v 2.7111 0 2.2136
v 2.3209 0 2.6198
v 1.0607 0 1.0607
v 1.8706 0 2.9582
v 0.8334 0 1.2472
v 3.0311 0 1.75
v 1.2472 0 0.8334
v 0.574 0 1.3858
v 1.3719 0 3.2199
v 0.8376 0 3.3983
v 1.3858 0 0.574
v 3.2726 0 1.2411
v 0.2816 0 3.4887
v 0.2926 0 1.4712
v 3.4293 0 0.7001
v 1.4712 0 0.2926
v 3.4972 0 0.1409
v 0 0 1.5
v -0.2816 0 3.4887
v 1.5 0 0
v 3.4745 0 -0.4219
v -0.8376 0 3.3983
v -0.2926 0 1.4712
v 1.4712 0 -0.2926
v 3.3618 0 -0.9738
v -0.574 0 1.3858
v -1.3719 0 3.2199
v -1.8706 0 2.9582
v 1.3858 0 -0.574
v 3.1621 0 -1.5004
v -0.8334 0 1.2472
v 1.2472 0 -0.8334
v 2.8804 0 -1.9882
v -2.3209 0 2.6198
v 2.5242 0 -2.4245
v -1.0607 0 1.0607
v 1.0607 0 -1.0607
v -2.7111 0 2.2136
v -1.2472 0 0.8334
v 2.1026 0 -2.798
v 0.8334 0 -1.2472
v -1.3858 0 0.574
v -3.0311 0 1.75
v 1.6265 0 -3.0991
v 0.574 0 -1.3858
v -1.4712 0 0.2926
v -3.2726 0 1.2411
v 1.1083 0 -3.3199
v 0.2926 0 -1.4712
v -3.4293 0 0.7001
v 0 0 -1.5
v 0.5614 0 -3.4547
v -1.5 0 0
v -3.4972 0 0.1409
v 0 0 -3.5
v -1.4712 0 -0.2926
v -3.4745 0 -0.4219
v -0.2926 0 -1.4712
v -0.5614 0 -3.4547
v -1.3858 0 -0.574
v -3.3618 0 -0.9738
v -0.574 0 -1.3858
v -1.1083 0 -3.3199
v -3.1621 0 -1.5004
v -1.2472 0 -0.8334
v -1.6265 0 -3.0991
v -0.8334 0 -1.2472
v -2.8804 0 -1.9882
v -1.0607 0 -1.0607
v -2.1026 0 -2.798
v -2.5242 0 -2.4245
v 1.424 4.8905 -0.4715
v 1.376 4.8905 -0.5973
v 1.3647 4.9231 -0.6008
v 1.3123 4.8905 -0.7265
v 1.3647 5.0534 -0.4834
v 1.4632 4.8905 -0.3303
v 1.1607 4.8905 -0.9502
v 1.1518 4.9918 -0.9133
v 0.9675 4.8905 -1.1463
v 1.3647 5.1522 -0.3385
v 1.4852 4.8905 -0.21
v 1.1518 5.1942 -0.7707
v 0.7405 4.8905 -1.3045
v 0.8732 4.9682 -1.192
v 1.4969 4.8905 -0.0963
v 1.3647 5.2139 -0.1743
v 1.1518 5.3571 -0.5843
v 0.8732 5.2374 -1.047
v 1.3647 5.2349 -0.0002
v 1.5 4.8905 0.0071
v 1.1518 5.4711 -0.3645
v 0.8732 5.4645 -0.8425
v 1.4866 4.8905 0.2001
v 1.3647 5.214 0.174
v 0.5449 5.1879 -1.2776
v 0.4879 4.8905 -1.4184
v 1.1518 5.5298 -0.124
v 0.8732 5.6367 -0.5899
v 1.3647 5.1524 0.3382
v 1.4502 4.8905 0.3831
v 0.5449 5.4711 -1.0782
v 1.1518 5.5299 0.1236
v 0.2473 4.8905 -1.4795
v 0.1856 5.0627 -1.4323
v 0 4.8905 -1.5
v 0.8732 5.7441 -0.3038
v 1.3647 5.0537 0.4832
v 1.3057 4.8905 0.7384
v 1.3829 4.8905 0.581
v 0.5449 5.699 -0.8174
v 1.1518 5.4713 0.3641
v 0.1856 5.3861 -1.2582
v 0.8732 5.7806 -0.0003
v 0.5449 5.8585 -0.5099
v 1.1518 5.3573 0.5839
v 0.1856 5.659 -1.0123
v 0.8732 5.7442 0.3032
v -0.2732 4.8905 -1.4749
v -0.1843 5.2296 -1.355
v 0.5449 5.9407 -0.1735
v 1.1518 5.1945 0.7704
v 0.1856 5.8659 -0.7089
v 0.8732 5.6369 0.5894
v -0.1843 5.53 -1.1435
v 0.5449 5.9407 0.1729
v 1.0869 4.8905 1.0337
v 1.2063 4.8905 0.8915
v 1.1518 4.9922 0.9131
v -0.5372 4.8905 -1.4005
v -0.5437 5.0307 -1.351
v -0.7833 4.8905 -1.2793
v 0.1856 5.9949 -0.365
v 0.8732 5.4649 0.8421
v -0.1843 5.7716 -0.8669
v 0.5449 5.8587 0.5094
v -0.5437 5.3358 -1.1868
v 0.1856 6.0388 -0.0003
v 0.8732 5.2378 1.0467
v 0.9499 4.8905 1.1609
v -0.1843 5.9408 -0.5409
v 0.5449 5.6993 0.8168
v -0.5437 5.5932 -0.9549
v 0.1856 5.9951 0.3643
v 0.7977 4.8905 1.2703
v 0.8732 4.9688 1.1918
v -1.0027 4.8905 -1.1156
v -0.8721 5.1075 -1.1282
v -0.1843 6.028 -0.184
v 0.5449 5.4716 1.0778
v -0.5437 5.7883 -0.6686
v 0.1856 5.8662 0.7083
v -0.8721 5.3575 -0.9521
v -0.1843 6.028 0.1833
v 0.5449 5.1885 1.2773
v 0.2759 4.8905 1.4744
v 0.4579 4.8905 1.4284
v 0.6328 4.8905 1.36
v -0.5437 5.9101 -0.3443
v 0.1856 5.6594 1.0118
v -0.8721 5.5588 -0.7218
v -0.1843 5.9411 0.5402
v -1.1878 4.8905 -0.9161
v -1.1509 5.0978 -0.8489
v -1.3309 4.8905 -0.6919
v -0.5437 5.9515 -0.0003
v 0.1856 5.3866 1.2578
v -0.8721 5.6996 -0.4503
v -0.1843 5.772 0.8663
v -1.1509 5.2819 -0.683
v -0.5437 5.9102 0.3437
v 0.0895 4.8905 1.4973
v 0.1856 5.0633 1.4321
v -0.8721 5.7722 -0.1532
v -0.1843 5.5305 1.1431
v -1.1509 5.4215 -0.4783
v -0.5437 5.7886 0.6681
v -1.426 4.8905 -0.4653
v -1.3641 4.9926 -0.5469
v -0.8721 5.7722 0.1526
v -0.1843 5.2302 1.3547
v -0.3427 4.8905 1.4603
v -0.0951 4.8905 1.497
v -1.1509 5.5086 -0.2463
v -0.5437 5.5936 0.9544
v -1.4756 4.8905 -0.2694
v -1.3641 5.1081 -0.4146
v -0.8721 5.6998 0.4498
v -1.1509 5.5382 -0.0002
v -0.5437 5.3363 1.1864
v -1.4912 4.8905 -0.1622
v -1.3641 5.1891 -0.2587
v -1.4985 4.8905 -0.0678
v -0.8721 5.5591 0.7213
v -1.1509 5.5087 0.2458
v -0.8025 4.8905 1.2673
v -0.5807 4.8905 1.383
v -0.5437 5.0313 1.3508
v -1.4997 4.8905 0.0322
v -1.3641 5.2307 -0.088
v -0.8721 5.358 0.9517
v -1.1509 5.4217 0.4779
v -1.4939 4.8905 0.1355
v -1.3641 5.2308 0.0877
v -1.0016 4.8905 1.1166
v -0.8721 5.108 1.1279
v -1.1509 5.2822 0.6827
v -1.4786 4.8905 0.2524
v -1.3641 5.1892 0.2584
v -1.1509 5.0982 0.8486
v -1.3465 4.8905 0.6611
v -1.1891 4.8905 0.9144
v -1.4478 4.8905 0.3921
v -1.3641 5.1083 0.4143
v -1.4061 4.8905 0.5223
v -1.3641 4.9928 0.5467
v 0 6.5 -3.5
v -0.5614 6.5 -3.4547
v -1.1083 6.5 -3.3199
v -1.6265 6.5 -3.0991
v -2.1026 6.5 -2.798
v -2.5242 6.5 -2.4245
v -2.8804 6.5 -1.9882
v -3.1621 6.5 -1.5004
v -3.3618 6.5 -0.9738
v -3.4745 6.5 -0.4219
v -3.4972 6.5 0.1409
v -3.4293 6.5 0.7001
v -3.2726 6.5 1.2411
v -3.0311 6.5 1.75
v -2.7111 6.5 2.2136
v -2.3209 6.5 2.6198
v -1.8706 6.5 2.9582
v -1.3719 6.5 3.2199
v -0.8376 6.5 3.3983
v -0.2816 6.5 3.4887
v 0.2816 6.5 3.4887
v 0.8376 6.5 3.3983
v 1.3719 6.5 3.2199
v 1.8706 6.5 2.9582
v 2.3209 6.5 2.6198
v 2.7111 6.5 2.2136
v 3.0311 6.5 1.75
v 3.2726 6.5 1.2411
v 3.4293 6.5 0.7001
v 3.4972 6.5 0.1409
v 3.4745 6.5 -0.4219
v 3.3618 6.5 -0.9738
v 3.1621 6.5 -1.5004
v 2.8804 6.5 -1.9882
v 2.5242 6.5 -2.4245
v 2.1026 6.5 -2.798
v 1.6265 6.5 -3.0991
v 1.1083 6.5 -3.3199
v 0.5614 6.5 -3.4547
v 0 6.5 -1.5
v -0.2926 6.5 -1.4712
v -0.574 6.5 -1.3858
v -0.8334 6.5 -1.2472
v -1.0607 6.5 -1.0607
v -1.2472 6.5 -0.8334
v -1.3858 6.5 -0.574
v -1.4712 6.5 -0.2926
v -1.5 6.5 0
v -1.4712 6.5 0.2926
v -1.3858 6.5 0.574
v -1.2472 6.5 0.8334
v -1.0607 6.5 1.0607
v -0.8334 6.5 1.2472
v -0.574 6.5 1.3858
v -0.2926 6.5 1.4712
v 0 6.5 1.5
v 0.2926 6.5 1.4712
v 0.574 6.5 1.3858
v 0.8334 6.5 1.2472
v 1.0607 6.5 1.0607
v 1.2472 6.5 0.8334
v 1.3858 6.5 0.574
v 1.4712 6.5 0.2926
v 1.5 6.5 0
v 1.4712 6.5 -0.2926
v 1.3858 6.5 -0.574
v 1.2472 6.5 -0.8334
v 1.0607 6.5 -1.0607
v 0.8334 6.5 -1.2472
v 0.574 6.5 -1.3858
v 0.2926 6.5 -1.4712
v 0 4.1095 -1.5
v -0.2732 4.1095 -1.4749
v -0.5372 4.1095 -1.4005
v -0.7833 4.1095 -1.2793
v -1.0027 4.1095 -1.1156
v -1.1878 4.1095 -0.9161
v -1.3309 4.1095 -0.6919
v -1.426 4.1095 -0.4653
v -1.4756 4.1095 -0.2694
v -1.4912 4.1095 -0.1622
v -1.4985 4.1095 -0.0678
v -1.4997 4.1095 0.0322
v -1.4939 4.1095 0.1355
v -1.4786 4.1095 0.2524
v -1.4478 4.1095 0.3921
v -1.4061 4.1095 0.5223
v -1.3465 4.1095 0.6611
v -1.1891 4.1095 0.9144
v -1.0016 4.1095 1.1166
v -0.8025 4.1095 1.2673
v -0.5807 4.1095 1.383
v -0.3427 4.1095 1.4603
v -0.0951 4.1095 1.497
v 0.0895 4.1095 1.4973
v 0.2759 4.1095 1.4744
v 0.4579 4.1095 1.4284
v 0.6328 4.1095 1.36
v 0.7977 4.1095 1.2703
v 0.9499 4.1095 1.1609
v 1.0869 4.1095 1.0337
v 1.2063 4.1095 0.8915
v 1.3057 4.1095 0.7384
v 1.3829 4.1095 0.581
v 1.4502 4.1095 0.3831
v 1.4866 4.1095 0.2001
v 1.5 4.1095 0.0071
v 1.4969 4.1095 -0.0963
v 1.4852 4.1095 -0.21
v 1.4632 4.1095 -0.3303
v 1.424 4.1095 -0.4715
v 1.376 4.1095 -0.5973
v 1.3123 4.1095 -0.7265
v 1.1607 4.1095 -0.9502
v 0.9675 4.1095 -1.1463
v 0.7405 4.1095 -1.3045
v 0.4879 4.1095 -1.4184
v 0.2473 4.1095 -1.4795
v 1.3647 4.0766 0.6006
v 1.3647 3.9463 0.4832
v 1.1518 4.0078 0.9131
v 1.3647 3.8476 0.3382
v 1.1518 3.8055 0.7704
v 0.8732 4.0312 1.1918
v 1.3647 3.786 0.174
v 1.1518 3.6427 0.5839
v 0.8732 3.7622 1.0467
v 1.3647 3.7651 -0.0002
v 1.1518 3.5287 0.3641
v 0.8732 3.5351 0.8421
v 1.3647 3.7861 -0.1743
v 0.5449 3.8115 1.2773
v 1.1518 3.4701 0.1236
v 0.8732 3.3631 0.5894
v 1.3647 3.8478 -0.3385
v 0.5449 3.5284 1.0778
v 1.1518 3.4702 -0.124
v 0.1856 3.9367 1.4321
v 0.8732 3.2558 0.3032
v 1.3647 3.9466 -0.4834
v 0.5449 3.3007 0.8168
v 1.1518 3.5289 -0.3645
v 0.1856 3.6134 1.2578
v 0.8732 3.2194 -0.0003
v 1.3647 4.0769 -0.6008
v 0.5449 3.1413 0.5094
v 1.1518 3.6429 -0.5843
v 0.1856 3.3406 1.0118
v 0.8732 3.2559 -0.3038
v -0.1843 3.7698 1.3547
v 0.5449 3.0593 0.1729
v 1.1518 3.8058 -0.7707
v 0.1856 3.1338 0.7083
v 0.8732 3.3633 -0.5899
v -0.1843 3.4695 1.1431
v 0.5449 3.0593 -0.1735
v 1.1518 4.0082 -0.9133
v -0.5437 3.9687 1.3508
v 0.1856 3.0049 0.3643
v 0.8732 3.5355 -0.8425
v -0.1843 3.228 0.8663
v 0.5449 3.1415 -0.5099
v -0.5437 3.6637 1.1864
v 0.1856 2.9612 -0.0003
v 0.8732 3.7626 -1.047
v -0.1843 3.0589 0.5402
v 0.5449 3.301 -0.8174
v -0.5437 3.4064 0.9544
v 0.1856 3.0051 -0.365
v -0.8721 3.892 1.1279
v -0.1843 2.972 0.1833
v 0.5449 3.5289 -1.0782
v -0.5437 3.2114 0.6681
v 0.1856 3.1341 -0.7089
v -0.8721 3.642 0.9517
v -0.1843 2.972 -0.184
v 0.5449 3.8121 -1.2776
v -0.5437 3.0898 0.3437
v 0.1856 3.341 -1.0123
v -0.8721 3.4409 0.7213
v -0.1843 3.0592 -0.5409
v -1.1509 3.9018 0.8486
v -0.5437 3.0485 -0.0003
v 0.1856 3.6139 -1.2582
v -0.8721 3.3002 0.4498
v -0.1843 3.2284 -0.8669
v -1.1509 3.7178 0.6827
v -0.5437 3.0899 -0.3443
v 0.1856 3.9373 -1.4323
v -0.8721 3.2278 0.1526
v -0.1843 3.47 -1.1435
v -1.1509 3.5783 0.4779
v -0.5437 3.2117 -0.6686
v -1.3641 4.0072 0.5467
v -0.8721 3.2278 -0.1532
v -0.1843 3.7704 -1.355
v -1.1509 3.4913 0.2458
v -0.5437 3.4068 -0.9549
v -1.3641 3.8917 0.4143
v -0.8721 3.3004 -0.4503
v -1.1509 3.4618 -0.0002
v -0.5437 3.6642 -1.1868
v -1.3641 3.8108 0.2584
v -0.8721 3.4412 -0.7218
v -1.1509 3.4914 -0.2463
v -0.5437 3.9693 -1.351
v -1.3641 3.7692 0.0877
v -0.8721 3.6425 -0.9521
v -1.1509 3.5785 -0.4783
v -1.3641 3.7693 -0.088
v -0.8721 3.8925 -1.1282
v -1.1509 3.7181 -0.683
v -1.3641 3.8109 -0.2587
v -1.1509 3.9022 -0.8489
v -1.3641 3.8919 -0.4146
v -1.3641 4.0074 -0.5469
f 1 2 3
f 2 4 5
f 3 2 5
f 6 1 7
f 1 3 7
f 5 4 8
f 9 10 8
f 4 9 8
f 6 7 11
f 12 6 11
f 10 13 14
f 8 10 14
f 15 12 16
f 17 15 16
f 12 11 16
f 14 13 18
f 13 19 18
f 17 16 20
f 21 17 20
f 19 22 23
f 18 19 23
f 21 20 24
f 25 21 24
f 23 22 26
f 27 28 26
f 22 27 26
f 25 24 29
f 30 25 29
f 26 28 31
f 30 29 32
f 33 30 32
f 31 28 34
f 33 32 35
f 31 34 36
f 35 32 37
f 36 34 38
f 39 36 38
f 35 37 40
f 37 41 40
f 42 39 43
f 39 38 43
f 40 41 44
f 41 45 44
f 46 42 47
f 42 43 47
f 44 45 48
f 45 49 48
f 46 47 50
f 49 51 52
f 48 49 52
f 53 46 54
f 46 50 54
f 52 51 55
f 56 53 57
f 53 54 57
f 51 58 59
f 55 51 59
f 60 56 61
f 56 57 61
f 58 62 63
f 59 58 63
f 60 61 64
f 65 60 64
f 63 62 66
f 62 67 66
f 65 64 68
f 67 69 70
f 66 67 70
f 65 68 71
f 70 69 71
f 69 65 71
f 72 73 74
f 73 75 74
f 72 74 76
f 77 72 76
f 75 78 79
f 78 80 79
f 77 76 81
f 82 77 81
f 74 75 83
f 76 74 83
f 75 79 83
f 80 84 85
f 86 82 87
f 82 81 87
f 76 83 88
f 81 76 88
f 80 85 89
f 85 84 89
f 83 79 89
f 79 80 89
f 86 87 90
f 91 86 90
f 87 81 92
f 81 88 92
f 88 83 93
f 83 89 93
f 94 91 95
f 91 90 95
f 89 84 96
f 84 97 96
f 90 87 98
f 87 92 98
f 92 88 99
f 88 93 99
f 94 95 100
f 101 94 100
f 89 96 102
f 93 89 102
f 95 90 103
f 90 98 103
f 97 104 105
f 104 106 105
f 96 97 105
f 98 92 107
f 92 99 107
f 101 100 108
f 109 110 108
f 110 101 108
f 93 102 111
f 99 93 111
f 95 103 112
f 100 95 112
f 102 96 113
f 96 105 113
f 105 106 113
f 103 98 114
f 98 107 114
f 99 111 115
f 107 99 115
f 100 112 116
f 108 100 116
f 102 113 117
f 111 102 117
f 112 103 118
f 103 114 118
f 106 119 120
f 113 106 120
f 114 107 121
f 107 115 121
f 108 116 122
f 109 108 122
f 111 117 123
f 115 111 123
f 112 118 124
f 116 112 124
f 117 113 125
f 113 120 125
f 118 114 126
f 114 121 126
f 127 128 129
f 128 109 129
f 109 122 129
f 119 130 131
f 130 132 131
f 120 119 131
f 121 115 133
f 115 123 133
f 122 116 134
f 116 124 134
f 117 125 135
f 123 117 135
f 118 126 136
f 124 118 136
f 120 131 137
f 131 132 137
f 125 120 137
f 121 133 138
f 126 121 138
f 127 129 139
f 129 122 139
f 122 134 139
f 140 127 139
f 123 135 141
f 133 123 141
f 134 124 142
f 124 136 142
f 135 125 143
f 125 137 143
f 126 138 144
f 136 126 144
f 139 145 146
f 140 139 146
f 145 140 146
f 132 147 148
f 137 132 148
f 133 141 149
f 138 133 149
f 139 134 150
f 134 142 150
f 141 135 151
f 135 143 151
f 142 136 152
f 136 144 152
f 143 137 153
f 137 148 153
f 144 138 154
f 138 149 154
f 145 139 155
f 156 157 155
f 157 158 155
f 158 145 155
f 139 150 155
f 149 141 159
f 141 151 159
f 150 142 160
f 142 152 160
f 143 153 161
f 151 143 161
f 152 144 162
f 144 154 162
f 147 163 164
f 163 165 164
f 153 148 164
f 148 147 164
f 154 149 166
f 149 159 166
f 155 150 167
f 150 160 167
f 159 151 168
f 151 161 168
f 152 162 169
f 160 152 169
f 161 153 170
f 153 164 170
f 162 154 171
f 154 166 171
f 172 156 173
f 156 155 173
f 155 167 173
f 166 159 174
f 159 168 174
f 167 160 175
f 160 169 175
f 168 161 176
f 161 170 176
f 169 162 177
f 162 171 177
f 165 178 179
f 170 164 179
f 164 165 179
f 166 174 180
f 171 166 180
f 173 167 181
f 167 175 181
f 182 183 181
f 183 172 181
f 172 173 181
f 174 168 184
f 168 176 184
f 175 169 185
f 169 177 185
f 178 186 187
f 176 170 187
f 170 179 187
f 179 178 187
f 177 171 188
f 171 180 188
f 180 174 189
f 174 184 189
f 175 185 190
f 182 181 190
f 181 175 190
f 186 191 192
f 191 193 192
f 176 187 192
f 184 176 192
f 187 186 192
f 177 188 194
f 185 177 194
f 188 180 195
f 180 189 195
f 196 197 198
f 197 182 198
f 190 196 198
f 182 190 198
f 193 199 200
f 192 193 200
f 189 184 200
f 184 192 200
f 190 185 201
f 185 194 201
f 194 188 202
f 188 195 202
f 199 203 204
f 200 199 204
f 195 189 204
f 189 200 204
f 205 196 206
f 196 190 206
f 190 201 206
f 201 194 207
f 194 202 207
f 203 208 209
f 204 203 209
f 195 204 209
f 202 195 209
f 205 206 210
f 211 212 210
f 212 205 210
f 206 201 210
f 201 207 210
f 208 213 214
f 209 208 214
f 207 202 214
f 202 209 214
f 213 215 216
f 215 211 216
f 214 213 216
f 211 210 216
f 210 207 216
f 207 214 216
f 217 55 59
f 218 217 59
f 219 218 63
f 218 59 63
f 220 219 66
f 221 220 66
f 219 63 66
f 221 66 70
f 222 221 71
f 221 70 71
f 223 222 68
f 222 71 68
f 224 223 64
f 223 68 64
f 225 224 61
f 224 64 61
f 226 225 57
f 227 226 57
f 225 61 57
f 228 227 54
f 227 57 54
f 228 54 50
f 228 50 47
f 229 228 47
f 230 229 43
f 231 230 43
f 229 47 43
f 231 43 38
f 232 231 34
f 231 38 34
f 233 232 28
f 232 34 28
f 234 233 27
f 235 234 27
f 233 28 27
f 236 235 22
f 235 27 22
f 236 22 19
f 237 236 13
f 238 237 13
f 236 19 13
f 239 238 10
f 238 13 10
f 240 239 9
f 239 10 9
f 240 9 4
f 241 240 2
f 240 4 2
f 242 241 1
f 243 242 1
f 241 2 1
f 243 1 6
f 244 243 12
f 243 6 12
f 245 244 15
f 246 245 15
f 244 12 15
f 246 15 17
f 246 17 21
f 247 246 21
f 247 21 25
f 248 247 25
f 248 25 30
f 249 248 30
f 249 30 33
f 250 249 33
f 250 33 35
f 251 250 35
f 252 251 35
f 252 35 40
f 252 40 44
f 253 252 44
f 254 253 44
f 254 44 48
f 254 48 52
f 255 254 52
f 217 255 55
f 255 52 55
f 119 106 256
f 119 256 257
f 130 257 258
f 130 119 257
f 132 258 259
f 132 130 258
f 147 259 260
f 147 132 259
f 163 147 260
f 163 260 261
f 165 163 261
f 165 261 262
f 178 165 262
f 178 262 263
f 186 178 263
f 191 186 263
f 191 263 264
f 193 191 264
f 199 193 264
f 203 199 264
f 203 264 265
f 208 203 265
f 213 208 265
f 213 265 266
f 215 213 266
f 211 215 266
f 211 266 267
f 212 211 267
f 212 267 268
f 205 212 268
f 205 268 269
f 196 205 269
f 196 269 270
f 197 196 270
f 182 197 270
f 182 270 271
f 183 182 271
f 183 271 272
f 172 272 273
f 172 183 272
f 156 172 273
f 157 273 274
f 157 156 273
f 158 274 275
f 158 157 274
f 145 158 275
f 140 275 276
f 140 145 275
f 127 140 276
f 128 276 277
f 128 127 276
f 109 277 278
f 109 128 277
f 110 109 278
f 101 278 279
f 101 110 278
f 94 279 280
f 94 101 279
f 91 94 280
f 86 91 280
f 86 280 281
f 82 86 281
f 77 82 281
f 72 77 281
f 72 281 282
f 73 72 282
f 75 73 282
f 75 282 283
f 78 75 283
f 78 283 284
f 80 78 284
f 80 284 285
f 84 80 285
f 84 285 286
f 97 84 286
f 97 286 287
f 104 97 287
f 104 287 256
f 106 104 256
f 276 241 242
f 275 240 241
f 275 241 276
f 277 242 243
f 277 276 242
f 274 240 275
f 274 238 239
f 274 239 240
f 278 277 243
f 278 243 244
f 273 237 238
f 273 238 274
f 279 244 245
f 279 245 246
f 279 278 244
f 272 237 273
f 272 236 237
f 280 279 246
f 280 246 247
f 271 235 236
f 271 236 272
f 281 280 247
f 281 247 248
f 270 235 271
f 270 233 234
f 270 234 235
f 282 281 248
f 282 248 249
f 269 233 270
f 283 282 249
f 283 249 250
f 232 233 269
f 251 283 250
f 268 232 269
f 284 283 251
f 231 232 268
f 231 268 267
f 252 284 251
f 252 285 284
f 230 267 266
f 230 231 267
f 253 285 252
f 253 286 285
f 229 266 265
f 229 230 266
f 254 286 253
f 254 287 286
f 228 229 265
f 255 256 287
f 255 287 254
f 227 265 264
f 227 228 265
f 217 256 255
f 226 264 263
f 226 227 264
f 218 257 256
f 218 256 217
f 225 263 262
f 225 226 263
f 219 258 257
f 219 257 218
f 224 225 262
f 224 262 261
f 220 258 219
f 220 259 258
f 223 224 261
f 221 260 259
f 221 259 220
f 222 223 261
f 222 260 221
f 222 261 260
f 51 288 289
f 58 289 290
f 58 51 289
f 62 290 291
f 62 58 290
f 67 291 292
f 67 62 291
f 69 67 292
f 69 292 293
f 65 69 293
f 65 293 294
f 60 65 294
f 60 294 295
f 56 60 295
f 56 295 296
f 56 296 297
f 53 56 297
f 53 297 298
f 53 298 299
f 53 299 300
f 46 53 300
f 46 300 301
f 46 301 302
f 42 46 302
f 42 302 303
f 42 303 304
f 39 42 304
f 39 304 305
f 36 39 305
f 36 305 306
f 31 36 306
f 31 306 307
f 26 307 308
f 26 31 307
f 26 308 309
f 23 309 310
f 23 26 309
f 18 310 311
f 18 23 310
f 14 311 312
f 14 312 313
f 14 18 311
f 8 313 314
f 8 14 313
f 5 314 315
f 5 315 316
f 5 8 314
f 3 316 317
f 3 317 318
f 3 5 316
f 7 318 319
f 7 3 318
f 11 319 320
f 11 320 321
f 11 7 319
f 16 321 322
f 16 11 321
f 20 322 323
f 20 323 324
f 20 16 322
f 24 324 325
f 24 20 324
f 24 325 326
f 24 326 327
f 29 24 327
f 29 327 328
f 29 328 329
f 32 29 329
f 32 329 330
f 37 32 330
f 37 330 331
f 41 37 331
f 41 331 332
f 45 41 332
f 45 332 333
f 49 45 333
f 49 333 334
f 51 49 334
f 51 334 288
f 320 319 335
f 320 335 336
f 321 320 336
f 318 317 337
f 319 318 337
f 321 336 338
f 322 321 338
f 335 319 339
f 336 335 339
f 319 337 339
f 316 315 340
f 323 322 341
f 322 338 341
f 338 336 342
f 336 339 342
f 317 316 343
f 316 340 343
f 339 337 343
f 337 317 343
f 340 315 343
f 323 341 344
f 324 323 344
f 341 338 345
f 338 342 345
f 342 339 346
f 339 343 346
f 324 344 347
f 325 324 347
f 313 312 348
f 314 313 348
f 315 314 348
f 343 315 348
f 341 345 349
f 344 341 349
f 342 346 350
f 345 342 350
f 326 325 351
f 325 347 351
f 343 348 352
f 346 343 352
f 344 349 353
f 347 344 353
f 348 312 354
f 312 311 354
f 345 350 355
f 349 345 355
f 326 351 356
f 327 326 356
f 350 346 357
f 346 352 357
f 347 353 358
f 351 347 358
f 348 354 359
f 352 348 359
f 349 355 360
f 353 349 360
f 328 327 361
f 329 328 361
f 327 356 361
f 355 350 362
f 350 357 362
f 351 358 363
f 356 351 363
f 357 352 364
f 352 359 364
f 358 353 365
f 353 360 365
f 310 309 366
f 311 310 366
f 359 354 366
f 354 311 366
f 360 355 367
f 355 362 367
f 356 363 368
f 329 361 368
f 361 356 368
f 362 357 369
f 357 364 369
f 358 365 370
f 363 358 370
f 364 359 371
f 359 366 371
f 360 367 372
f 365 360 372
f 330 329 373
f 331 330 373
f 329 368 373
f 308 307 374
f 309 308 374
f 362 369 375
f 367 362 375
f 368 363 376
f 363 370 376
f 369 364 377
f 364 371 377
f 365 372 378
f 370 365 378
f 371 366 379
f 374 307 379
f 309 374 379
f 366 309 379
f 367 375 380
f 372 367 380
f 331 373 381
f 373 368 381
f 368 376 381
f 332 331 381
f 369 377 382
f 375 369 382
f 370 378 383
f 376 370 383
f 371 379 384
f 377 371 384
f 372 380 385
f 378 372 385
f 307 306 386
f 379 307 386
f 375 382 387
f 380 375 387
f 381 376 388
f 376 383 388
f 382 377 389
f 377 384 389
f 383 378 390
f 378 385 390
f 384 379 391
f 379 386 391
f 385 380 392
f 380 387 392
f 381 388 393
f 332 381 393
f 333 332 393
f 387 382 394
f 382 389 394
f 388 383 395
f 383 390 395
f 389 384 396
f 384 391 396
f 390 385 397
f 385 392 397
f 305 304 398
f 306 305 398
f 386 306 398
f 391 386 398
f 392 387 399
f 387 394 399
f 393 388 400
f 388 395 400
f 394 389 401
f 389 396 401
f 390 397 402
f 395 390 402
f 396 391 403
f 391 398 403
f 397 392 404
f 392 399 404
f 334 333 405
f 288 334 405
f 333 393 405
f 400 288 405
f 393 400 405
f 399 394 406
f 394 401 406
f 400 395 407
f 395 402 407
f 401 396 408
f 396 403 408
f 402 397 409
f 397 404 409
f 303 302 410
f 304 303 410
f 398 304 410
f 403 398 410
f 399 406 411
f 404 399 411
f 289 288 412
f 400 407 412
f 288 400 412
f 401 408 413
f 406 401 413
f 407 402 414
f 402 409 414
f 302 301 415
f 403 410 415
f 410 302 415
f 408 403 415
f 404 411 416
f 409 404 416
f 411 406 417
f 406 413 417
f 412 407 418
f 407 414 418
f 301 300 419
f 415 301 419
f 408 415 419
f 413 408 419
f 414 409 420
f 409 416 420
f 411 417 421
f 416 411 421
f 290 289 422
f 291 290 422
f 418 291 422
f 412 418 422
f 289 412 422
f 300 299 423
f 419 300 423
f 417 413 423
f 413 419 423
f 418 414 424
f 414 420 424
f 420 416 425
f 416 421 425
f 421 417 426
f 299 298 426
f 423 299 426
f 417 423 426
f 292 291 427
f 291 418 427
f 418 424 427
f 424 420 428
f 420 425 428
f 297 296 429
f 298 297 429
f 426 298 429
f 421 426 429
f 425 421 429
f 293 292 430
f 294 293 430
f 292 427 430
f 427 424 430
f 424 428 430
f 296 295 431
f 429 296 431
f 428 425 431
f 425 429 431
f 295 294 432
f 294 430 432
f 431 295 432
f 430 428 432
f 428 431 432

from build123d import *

# Parameters (mm, degrees)
SKETCH_1_R      = 3.5
SKETCH_1_R_2    = 1.5
EXTRUDE_1_DEPTH = 6.5


with BuildPart() as part:
    # 草图1 → 凸台-拉伸1 (new body)
    with BuildSketch(Plane(origin=(0, 0, 0), x_dir=(1, 0, 0), z_dir=(0, 1, 0))):
        with Locations(Location((0, 0, 0), (0, 0, 90))):
            Circle(SKETCH_1_R)
        with Locations(Location((0, 0, 0), (0, 0, 90))):
            Circle(SKETCH_1_R_2, mode=Mode.SUBTRACT)
    extrude(amount=EXTRUDE_1_DEPTH)

    # 草图3 → 旋转5 (revolve)
    with BuildSketch(Plane(origin=(0, 4.5, 0), x_dir=(1, 0, 0), z_dir=(0, 1, 0))):
        with BuildLine():
            Line((-1.55, 0), (1.55, 0))
            ThreePointArc((1.55, 0), (0, -1.55), (-1.55, 0))
        make_face()
    revolve(axis=Axis((-3.959014724, 4.5, 0), (1, 0, 0)))


solid = part.part
